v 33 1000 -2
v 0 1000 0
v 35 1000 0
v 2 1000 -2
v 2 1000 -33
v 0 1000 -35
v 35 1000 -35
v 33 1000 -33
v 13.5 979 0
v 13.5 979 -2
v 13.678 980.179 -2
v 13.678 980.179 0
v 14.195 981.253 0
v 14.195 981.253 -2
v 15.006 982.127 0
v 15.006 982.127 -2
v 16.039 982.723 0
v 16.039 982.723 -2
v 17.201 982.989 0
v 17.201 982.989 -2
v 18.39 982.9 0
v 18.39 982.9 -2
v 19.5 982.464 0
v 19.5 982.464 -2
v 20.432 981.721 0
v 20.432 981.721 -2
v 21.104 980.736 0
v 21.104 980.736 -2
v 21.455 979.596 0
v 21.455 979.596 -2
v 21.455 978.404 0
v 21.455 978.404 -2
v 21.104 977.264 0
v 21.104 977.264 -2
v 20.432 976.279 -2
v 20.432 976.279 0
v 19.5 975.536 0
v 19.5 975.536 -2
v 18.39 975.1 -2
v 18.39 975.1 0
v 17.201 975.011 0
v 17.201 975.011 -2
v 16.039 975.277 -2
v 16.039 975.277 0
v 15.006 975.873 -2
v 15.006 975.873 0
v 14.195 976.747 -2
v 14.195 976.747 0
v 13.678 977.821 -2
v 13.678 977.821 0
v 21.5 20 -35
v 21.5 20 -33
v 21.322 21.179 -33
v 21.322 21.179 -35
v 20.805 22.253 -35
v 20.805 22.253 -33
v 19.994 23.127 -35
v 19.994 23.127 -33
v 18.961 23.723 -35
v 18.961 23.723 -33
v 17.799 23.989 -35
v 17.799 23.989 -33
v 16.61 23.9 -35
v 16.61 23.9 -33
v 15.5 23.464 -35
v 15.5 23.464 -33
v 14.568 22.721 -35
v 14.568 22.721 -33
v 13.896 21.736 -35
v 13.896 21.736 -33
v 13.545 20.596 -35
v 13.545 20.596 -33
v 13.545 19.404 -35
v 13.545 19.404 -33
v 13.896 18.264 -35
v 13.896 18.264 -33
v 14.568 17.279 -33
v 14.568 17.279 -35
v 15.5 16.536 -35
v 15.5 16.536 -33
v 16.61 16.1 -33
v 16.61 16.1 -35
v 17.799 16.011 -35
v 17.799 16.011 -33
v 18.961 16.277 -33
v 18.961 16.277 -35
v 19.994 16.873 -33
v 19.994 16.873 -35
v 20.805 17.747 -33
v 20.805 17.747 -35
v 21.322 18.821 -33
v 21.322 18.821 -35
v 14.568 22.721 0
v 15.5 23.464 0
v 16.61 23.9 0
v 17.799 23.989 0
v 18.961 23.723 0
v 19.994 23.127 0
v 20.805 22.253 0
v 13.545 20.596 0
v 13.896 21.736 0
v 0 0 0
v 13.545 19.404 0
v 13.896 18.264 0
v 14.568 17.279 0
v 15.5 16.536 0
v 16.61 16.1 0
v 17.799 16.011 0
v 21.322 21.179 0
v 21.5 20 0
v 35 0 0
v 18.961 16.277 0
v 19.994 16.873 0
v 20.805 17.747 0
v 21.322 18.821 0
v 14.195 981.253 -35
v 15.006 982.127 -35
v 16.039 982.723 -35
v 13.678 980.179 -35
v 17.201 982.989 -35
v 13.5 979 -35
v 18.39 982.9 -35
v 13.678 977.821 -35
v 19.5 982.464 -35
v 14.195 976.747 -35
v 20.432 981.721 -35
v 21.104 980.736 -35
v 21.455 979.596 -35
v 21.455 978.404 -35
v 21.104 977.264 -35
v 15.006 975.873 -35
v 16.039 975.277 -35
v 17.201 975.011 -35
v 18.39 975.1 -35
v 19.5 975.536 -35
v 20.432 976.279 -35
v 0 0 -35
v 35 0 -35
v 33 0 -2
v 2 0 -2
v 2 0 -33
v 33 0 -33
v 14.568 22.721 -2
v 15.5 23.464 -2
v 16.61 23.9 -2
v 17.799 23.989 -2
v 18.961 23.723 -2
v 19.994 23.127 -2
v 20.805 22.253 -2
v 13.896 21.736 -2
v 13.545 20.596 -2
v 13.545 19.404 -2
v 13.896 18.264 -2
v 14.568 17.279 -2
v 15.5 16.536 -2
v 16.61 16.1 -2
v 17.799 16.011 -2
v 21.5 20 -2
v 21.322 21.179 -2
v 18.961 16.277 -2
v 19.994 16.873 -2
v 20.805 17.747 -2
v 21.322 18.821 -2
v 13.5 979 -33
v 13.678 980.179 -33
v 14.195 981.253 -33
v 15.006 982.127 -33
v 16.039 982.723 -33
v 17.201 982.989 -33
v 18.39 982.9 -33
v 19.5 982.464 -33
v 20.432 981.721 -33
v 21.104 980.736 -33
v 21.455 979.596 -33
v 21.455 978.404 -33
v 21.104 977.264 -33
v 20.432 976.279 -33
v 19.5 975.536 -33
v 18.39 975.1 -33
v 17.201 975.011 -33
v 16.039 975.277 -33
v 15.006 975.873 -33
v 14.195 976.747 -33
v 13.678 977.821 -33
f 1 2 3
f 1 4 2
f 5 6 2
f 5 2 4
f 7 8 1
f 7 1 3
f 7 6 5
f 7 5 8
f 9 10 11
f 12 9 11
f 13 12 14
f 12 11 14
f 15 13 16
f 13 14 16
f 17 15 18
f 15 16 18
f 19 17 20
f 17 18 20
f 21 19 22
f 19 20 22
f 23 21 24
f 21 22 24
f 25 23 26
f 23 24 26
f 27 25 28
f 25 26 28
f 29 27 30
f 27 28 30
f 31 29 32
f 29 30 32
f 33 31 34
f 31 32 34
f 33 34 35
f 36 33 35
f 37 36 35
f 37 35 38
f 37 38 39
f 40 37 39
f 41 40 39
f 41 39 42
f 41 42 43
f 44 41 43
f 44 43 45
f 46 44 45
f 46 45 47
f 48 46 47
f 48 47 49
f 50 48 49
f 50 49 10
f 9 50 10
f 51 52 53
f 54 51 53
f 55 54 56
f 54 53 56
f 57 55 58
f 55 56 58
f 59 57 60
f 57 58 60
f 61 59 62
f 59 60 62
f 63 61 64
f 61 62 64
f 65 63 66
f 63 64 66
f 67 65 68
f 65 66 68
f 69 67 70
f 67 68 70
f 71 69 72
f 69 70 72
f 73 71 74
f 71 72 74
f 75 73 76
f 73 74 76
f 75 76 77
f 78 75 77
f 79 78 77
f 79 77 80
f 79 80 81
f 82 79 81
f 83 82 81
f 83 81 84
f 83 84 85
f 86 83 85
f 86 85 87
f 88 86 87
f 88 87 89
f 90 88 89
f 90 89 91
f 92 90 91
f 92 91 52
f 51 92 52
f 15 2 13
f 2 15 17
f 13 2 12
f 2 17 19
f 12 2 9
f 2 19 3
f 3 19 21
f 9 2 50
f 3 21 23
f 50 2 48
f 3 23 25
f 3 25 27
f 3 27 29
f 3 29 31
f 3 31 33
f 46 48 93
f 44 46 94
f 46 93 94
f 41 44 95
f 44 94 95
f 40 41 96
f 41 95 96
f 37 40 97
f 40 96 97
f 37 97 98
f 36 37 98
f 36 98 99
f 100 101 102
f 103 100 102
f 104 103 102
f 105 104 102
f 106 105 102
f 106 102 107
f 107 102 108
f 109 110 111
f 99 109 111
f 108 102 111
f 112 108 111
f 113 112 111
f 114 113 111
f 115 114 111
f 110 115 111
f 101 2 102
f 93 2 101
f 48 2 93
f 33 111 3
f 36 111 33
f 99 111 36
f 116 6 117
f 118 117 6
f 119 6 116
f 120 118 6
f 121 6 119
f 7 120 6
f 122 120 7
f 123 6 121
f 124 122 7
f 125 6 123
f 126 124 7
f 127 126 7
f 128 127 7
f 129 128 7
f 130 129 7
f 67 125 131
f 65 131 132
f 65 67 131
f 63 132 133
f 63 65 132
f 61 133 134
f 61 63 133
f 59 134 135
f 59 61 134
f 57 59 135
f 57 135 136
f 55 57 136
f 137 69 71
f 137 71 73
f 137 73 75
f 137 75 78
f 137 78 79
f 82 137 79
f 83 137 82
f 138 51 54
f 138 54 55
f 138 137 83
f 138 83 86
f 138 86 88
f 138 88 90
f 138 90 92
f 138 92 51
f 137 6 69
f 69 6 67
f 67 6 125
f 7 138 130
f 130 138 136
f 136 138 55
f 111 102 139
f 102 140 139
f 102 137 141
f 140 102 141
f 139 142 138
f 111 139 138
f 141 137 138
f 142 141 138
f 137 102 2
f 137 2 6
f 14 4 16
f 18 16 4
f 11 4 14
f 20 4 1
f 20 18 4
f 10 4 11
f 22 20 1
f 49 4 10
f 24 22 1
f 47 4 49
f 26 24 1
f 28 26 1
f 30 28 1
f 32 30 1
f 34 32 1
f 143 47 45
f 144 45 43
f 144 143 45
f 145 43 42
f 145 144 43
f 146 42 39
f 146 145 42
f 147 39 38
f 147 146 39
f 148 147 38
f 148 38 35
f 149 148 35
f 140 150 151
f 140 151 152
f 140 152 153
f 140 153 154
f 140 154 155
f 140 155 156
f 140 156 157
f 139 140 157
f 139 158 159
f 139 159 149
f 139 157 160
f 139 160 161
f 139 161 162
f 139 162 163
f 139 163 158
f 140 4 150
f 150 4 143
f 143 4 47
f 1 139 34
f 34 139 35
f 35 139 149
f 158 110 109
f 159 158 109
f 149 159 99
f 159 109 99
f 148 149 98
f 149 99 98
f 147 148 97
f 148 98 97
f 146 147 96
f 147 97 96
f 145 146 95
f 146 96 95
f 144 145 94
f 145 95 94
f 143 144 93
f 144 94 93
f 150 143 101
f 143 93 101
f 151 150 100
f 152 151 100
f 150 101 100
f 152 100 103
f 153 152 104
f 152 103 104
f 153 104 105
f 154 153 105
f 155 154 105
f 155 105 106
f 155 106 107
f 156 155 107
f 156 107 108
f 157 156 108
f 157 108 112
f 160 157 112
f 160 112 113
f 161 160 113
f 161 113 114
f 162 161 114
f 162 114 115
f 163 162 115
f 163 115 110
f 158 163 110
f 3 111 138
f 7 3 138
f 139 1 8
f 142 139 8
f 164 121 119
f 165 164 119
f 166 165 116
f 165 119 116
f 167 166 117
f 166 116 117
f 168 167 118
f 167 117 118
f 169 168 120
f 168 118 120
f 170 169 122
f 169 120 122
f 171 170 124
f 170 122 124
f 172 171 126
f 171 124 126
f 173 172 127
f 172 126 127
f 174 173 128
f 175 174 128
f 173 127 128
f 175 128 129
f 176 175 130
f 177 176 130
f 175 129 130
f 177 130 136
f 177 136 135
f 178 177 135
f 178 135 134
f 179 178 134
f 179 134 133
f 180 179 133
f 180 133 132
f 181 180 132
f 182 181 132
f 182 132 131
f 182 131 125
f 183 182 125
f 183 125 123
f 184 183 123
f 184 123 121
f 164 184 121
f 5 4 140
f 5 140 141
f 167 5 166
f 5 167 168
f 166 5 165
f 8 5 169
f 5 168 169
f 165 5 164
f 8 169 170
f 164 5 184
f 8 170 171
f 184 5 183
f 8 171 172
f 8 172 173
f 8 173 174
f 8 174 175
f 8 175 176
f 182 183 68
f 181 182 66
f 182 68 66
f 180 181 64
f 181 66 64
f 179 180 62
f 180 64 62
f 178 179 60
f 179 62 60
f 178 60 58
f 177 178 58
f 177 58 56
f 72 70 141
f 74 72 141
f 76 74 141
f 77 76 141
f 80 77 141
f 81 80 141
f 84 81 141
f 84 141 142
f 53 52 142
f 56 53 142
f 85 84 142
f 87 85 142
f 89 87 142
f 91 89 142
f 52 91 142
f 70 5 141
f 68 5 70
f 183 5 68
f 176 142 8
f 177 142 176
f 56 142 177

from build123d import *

# Parameters (mm, degrees)
CROQUIS1_W              = 35
CROQUIS1_H              = 35
CROQUIS1_W_2            = 31
CROQUIS1_H_2            = 31
SALIENTE_EXTRUIR1_DEPTH = 1000
CROQUIS2_R              = 4
CORTAR_EXTRUIR1_DEPTH   = 35
CROQUIS3_R              = 4
CORTAR_EXTRUIR2_DEPTH   = 35


with BuildPart() as part:
    # Croquis1 → Saliente-Extruir1 (new body)
    with BuildSketch(Plane(origin=(0, 0, 0), x_dir=(1, 0, 0), z_dir=(0, 1, 0))):
        with Locations((17.5, 17.5)):
            Rectangle(CROQUIS1_W, CROQUIS1_H)
        with Locations((17.5, 17.5)):
            Rectangle(CROQUIS1_W_2, CROQUIS1_H_2, mode=Mode.SUBTRACT)
    extrude(amount=SALIENTE_EXTRUIR1_DEPTH)

    # Croquis2 → Cortar-Extruir1 (cut)
    with BuildSketch(Plane.XY):
        with Locations((17.5, 20)):
            Circle(CROQUIS2_R)
    extrude(amount=-CORTAR_EXTRUIR1_DEPTH, mode=Mode.SUBTRACT)

    # Croquis3 → Cortar-Extruir2 (cut)
    with BuildSketch(Plane(origin=(0, 0, -35), x_dir=(-1, 0, 0), z_dir=(0, 0, -1))):
        with Locations((-17.5, 979)):
            Circle(CROQUIS3_R)
    extrude(amount=-CORTAR_EXTRUIR2_DEPTH, mode=Mode.SUBTRACT)


solid = part.part
